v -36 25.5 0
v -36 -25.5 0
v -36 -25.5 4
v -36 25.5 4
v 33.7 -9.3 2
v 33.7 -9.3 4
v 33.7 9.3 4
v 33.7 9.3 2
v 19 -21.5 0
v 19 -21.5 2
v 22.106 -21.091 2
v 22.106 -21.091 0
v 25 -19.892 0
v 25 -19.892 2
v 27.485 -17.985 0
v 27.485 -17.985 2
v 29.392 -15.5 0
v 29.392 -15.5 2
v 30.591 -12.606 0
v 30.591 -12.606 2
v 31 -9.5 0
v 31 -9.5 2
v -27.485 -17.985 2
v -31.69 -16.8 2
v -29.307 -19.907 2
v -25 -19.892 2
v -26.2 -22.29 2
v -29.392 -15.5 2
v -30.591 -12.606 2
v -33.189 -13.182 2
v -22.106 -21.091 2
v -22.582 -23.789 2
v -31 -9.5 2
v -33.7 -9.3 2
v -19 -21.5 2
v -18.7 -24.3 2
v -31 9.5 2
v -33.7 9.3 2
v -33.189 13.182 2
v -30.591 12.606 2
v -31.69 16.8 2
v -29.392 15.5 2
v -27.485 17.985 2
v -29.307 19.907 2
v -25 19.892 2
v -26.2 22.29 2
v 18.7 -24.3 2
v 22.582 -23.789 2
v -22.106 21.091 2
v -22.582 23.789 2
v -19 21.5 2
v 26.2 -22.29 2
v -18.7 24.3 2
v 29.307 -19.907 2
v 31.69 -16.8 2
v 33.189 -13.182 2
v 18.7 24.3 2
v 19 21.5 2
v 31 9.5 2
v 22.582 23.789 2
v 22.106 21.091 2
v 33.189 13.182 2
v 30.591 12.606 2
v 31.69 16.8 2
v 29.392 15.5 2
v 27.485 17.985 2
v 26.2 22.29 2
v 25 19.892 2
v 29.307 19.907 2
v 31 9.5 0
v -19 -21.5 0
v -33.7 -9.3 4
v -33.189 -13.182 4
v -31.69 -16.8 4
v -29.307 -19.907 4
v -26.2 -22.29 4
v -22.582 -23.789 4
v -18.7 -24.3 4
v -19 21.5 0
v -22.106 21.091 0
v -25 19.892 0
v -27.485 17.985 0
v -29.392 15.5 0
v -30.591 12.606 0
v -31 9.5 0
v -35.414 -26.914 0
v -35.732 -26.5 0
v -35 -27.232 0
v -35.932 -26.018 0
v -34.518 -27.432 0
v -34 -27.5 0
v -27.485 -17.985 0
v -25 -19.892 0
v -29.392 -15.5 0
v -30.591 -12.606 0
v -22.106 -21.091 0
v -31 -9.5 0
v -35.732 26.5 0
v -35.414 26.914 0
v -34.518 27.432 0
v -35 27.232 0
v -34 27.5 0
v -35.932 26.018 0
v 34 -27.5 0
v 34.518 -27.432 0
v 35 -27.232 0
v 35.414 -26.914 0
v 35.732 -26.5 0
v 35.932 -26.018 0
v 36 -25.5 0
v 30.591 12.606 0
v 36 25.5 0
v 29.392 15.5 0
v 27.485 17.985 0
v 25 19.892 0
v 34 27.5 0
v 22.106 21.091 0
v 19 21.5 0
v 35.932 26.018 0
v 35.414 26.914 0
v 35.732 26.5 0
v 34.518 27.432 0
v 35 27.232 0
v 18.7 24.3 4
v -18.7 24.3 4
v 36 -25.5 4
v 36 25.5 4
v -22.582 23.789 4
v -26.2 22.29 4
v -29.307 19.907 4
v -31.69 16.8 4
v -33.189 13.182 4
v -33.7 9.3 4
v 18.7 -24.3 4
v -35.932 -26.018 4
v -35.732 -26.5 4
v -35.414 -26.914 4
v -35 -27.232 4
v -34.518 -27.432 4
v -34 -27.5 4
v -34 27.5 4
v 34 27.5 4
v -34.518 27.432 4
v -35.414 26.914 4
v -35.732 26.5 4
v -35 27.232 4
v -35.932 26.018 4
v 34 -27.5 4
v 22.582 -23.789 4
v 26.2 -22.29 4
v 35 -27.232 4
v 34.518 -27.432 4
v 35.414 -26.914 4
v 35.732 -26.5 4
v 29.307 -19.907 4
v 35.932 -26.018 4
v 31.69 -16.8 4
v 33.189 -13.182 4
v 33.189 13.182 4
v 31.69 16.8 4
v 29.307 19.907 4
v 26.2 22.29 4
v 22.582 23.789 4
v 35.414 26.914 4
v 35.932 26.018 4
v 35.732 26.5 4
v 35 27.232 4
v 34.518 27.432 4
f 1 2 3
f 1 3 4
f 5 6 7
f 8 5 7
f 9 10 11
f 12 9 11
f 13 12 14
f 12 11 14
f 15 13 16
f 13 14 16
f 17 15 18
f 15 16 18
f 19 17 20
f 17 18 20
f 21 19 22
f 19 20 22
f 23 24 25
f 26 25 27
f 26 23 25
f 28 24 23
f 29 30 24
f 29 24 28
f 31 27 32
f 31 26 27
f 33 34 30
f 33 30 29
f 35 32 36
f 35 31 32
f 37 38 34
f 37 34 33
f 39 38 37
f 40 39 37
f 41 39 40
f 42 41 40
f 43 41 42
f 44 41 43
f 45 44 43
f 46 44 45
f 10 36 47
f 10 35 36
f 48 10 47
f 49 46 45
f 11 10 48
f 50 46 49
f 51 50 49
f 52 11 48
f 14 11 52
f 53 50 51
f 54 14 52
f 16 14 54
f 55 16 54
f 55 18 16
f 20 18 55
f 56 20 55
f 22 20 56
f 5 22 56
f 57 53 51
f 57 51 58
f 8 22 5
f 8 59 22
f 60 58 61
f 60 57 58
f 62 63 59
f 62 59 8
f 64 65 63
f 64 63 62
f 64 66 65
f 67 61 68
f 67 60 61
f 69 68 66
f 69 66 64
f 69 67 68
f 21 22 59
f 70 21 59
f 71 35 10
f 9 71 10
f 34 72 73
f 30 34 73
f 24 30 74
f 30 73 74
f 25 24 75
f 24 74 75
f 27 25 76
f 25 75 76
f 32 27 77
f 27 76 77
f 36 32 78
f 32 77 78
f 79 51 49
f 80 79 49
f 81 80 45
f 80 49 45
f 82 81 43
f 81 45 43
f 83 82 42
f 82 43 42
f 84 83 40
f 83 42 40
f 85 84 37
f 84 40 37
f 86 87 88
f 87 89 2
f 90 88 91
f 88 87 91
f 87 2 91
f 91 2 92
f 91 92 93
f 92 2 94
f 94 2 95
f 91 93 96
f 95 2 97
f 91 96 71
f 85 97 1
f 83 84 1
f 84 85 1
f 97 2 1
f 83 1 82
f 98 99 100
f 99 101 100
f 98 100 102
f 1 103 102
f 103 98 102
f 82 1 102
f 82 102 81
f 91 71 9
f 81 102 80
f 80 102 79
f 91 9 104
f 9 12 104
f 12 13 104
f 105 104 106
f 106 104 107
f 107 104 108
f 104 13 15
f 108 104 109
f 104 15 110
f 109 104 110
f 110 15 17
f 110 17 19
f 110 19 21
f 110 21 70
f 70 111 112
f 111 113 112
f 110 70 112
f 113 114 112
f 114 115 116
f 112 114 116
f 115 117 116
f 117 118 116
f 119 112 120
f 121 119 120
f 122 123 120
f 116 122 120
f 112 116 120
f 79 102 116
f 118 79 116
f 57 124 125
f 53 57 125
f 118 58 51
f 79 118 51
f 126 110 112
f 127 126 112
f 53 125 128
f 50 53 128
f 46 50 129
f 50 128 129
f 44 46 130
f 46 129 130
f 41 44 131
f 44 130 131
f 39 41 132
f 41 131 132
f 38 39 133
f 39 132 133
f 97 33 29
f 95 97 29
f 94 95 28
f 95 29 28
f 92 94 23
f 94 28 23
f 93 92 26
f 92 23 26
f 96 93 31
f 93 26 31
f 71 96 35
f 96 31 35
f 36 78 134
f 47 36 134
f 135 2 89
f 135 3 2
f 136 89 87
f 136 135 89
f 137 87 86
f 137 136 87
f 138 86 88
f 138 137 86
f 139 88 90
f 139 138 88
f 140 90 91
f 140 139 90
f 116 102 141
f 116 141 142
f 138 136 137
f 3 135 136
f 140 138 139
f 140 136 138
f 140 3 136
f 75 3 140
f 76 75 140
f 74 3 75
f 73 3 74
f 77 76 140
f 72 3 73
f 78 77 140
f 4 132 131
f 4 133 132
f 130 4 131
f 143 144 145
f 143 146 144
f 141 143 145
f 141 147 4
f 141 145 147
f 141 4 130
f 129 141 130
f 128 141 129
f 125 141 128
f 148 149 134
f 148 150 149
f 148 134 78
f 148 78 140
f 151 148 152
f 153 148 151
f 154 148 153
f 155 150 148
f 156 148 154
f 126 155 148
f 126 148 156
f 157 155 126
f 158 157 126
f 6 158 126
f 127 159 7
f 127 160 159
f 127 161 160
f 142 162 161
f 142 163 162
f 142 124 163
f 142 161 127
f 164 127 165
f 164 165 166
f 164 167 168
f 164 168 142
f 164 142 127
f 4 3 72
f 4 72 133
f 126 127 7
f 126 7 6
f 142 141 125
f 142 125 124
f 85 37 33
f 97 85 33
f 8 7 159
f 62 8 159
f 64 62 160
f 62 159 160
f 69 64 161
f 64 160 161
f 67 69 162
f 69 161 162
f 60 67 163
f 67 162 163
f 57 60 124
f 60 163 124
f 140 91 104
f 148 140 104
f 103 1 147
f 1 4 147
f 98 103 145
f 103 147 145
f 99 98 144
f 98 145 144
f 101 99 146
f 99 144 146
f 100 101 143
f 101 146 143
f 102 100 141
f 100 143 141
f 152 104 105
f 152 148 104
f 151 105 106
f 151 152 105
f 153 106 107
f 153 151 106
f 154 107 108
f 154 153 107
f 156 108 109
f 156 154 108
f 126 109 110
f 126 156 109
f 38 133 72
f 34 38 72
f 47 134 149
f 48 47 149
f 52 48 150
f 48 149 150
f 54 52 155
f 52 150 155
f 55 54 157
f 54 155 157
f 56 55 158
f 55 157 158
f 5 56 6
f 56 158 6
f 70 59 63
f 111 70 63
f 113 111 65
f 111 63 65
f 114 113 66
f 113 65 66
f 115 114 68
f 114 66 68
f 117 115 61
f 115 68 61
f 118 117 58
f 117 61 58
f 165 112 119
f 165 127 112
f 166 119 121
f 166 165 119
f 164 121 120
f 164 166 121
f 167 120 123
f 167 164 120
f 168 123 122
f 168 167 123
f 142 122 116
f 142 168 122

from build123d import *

# Parameters (mm, degrees)
SKETCH_1_W          = 72
SKETCH_1_H          = 55
EXTRUDE_1_DEPTH     = 4
FILLET_1_R          = 2
CUT_EXTRUDE_1_REACH = 6
CUT_EXTRUDE_2_DEPTH = 2


with BuildPart() as part:
    # 草图1 → 凸台-拉伸1 (new body)
    with BuildSketch(Plane.XY):
        Rectangle(SKETCH_1_W, SKETCH_1_H)
    extrude(amount=EXTRUDE_1_DEPTH)

    # 圆角1
    fillet_1_edges = [part.edges().sort_by_distance(p)[0] for p in [
        (-36, 27.5, 2),
        (36, 27.5, 2),
        (36, -27.5, 2),
        (-36, -27.5, 2),
    ]]
    fillet(fillet_1_edges, radius=FILLET_1_R)

    # 草图2 → 切除-拉伸1 (cut, up to next)
    with BuildSketch(Plane.XY.offset(4), mode=Mode.PRIVATE) as cut_extrude_1_sk1:
        with BuildLine():
            Line((-31, 9.5), (-31, -9.5))
            ThreePointArc((-31, -9.5), (-27.485281374, -17.985281374), (-19, -21.5))
            Line((-19, -21.5), (19, -21.5))
            ThreePointArc((19, -21.5), (27.485281374, -17.985281374), (31, -9.5))
            Line((31, -9.5), (31, 9.5))
            ThreePointArc((31, 9.5), (27.485281374, 17.985281374), (19, 21.5))
            Line((19, 21.5), (-19, 21.5))
            ThreePointArc((-19, 21.5), (-27.485281374, 17.985281374), (-31, 9.5))
        make_face()
    cut_extrude_1_tool1 = extrude(cut_extrude_1_sk1.sketch, amount=-CUT_EXTRUDE_1_REACH, mode=Mode.PRIVATE) & part.part
    add(cut_extrude_1_tool1.solids().sort_by_distance((0, 0, 4))[0], mode=Mode.SUBTRACT)

    # 草图3 → 切除-拉伸2 (cut)
    with BuildSketch(Plane.XY.offset(4)):
        with BuildLine():
            Line((18.7, 24.3), (-18.7, 24.3))
            ThreePointArc((-18.7, 24.3), (-29.306601718, 19.906601718), (-33.7, 9.3))
            Line((-33.7, 9.3), (-33.7, -9.3))
            ThreePointArc((-33.7, -9.3), (-29.306601718, -19.906601718), (-18.7, -24.3))
            Line((-18.7, -24.3), (18.7, -24.3))
            ThreePointArc((18.7, -24.3), (29.306601718, -19.906601718), (33.7, -9.3))
            Line((33.7, -9.3), (33.7, 9.3))
            ThreePointArc((33.7, 9.3), (29.306601718, 19.906601718), (18.7, 24.3))
        make_face()
    extrude(amount=-CUT_EXTRUDE_2_DEPTH, mode=Mode.SUBTRACT)


solid = part.part
